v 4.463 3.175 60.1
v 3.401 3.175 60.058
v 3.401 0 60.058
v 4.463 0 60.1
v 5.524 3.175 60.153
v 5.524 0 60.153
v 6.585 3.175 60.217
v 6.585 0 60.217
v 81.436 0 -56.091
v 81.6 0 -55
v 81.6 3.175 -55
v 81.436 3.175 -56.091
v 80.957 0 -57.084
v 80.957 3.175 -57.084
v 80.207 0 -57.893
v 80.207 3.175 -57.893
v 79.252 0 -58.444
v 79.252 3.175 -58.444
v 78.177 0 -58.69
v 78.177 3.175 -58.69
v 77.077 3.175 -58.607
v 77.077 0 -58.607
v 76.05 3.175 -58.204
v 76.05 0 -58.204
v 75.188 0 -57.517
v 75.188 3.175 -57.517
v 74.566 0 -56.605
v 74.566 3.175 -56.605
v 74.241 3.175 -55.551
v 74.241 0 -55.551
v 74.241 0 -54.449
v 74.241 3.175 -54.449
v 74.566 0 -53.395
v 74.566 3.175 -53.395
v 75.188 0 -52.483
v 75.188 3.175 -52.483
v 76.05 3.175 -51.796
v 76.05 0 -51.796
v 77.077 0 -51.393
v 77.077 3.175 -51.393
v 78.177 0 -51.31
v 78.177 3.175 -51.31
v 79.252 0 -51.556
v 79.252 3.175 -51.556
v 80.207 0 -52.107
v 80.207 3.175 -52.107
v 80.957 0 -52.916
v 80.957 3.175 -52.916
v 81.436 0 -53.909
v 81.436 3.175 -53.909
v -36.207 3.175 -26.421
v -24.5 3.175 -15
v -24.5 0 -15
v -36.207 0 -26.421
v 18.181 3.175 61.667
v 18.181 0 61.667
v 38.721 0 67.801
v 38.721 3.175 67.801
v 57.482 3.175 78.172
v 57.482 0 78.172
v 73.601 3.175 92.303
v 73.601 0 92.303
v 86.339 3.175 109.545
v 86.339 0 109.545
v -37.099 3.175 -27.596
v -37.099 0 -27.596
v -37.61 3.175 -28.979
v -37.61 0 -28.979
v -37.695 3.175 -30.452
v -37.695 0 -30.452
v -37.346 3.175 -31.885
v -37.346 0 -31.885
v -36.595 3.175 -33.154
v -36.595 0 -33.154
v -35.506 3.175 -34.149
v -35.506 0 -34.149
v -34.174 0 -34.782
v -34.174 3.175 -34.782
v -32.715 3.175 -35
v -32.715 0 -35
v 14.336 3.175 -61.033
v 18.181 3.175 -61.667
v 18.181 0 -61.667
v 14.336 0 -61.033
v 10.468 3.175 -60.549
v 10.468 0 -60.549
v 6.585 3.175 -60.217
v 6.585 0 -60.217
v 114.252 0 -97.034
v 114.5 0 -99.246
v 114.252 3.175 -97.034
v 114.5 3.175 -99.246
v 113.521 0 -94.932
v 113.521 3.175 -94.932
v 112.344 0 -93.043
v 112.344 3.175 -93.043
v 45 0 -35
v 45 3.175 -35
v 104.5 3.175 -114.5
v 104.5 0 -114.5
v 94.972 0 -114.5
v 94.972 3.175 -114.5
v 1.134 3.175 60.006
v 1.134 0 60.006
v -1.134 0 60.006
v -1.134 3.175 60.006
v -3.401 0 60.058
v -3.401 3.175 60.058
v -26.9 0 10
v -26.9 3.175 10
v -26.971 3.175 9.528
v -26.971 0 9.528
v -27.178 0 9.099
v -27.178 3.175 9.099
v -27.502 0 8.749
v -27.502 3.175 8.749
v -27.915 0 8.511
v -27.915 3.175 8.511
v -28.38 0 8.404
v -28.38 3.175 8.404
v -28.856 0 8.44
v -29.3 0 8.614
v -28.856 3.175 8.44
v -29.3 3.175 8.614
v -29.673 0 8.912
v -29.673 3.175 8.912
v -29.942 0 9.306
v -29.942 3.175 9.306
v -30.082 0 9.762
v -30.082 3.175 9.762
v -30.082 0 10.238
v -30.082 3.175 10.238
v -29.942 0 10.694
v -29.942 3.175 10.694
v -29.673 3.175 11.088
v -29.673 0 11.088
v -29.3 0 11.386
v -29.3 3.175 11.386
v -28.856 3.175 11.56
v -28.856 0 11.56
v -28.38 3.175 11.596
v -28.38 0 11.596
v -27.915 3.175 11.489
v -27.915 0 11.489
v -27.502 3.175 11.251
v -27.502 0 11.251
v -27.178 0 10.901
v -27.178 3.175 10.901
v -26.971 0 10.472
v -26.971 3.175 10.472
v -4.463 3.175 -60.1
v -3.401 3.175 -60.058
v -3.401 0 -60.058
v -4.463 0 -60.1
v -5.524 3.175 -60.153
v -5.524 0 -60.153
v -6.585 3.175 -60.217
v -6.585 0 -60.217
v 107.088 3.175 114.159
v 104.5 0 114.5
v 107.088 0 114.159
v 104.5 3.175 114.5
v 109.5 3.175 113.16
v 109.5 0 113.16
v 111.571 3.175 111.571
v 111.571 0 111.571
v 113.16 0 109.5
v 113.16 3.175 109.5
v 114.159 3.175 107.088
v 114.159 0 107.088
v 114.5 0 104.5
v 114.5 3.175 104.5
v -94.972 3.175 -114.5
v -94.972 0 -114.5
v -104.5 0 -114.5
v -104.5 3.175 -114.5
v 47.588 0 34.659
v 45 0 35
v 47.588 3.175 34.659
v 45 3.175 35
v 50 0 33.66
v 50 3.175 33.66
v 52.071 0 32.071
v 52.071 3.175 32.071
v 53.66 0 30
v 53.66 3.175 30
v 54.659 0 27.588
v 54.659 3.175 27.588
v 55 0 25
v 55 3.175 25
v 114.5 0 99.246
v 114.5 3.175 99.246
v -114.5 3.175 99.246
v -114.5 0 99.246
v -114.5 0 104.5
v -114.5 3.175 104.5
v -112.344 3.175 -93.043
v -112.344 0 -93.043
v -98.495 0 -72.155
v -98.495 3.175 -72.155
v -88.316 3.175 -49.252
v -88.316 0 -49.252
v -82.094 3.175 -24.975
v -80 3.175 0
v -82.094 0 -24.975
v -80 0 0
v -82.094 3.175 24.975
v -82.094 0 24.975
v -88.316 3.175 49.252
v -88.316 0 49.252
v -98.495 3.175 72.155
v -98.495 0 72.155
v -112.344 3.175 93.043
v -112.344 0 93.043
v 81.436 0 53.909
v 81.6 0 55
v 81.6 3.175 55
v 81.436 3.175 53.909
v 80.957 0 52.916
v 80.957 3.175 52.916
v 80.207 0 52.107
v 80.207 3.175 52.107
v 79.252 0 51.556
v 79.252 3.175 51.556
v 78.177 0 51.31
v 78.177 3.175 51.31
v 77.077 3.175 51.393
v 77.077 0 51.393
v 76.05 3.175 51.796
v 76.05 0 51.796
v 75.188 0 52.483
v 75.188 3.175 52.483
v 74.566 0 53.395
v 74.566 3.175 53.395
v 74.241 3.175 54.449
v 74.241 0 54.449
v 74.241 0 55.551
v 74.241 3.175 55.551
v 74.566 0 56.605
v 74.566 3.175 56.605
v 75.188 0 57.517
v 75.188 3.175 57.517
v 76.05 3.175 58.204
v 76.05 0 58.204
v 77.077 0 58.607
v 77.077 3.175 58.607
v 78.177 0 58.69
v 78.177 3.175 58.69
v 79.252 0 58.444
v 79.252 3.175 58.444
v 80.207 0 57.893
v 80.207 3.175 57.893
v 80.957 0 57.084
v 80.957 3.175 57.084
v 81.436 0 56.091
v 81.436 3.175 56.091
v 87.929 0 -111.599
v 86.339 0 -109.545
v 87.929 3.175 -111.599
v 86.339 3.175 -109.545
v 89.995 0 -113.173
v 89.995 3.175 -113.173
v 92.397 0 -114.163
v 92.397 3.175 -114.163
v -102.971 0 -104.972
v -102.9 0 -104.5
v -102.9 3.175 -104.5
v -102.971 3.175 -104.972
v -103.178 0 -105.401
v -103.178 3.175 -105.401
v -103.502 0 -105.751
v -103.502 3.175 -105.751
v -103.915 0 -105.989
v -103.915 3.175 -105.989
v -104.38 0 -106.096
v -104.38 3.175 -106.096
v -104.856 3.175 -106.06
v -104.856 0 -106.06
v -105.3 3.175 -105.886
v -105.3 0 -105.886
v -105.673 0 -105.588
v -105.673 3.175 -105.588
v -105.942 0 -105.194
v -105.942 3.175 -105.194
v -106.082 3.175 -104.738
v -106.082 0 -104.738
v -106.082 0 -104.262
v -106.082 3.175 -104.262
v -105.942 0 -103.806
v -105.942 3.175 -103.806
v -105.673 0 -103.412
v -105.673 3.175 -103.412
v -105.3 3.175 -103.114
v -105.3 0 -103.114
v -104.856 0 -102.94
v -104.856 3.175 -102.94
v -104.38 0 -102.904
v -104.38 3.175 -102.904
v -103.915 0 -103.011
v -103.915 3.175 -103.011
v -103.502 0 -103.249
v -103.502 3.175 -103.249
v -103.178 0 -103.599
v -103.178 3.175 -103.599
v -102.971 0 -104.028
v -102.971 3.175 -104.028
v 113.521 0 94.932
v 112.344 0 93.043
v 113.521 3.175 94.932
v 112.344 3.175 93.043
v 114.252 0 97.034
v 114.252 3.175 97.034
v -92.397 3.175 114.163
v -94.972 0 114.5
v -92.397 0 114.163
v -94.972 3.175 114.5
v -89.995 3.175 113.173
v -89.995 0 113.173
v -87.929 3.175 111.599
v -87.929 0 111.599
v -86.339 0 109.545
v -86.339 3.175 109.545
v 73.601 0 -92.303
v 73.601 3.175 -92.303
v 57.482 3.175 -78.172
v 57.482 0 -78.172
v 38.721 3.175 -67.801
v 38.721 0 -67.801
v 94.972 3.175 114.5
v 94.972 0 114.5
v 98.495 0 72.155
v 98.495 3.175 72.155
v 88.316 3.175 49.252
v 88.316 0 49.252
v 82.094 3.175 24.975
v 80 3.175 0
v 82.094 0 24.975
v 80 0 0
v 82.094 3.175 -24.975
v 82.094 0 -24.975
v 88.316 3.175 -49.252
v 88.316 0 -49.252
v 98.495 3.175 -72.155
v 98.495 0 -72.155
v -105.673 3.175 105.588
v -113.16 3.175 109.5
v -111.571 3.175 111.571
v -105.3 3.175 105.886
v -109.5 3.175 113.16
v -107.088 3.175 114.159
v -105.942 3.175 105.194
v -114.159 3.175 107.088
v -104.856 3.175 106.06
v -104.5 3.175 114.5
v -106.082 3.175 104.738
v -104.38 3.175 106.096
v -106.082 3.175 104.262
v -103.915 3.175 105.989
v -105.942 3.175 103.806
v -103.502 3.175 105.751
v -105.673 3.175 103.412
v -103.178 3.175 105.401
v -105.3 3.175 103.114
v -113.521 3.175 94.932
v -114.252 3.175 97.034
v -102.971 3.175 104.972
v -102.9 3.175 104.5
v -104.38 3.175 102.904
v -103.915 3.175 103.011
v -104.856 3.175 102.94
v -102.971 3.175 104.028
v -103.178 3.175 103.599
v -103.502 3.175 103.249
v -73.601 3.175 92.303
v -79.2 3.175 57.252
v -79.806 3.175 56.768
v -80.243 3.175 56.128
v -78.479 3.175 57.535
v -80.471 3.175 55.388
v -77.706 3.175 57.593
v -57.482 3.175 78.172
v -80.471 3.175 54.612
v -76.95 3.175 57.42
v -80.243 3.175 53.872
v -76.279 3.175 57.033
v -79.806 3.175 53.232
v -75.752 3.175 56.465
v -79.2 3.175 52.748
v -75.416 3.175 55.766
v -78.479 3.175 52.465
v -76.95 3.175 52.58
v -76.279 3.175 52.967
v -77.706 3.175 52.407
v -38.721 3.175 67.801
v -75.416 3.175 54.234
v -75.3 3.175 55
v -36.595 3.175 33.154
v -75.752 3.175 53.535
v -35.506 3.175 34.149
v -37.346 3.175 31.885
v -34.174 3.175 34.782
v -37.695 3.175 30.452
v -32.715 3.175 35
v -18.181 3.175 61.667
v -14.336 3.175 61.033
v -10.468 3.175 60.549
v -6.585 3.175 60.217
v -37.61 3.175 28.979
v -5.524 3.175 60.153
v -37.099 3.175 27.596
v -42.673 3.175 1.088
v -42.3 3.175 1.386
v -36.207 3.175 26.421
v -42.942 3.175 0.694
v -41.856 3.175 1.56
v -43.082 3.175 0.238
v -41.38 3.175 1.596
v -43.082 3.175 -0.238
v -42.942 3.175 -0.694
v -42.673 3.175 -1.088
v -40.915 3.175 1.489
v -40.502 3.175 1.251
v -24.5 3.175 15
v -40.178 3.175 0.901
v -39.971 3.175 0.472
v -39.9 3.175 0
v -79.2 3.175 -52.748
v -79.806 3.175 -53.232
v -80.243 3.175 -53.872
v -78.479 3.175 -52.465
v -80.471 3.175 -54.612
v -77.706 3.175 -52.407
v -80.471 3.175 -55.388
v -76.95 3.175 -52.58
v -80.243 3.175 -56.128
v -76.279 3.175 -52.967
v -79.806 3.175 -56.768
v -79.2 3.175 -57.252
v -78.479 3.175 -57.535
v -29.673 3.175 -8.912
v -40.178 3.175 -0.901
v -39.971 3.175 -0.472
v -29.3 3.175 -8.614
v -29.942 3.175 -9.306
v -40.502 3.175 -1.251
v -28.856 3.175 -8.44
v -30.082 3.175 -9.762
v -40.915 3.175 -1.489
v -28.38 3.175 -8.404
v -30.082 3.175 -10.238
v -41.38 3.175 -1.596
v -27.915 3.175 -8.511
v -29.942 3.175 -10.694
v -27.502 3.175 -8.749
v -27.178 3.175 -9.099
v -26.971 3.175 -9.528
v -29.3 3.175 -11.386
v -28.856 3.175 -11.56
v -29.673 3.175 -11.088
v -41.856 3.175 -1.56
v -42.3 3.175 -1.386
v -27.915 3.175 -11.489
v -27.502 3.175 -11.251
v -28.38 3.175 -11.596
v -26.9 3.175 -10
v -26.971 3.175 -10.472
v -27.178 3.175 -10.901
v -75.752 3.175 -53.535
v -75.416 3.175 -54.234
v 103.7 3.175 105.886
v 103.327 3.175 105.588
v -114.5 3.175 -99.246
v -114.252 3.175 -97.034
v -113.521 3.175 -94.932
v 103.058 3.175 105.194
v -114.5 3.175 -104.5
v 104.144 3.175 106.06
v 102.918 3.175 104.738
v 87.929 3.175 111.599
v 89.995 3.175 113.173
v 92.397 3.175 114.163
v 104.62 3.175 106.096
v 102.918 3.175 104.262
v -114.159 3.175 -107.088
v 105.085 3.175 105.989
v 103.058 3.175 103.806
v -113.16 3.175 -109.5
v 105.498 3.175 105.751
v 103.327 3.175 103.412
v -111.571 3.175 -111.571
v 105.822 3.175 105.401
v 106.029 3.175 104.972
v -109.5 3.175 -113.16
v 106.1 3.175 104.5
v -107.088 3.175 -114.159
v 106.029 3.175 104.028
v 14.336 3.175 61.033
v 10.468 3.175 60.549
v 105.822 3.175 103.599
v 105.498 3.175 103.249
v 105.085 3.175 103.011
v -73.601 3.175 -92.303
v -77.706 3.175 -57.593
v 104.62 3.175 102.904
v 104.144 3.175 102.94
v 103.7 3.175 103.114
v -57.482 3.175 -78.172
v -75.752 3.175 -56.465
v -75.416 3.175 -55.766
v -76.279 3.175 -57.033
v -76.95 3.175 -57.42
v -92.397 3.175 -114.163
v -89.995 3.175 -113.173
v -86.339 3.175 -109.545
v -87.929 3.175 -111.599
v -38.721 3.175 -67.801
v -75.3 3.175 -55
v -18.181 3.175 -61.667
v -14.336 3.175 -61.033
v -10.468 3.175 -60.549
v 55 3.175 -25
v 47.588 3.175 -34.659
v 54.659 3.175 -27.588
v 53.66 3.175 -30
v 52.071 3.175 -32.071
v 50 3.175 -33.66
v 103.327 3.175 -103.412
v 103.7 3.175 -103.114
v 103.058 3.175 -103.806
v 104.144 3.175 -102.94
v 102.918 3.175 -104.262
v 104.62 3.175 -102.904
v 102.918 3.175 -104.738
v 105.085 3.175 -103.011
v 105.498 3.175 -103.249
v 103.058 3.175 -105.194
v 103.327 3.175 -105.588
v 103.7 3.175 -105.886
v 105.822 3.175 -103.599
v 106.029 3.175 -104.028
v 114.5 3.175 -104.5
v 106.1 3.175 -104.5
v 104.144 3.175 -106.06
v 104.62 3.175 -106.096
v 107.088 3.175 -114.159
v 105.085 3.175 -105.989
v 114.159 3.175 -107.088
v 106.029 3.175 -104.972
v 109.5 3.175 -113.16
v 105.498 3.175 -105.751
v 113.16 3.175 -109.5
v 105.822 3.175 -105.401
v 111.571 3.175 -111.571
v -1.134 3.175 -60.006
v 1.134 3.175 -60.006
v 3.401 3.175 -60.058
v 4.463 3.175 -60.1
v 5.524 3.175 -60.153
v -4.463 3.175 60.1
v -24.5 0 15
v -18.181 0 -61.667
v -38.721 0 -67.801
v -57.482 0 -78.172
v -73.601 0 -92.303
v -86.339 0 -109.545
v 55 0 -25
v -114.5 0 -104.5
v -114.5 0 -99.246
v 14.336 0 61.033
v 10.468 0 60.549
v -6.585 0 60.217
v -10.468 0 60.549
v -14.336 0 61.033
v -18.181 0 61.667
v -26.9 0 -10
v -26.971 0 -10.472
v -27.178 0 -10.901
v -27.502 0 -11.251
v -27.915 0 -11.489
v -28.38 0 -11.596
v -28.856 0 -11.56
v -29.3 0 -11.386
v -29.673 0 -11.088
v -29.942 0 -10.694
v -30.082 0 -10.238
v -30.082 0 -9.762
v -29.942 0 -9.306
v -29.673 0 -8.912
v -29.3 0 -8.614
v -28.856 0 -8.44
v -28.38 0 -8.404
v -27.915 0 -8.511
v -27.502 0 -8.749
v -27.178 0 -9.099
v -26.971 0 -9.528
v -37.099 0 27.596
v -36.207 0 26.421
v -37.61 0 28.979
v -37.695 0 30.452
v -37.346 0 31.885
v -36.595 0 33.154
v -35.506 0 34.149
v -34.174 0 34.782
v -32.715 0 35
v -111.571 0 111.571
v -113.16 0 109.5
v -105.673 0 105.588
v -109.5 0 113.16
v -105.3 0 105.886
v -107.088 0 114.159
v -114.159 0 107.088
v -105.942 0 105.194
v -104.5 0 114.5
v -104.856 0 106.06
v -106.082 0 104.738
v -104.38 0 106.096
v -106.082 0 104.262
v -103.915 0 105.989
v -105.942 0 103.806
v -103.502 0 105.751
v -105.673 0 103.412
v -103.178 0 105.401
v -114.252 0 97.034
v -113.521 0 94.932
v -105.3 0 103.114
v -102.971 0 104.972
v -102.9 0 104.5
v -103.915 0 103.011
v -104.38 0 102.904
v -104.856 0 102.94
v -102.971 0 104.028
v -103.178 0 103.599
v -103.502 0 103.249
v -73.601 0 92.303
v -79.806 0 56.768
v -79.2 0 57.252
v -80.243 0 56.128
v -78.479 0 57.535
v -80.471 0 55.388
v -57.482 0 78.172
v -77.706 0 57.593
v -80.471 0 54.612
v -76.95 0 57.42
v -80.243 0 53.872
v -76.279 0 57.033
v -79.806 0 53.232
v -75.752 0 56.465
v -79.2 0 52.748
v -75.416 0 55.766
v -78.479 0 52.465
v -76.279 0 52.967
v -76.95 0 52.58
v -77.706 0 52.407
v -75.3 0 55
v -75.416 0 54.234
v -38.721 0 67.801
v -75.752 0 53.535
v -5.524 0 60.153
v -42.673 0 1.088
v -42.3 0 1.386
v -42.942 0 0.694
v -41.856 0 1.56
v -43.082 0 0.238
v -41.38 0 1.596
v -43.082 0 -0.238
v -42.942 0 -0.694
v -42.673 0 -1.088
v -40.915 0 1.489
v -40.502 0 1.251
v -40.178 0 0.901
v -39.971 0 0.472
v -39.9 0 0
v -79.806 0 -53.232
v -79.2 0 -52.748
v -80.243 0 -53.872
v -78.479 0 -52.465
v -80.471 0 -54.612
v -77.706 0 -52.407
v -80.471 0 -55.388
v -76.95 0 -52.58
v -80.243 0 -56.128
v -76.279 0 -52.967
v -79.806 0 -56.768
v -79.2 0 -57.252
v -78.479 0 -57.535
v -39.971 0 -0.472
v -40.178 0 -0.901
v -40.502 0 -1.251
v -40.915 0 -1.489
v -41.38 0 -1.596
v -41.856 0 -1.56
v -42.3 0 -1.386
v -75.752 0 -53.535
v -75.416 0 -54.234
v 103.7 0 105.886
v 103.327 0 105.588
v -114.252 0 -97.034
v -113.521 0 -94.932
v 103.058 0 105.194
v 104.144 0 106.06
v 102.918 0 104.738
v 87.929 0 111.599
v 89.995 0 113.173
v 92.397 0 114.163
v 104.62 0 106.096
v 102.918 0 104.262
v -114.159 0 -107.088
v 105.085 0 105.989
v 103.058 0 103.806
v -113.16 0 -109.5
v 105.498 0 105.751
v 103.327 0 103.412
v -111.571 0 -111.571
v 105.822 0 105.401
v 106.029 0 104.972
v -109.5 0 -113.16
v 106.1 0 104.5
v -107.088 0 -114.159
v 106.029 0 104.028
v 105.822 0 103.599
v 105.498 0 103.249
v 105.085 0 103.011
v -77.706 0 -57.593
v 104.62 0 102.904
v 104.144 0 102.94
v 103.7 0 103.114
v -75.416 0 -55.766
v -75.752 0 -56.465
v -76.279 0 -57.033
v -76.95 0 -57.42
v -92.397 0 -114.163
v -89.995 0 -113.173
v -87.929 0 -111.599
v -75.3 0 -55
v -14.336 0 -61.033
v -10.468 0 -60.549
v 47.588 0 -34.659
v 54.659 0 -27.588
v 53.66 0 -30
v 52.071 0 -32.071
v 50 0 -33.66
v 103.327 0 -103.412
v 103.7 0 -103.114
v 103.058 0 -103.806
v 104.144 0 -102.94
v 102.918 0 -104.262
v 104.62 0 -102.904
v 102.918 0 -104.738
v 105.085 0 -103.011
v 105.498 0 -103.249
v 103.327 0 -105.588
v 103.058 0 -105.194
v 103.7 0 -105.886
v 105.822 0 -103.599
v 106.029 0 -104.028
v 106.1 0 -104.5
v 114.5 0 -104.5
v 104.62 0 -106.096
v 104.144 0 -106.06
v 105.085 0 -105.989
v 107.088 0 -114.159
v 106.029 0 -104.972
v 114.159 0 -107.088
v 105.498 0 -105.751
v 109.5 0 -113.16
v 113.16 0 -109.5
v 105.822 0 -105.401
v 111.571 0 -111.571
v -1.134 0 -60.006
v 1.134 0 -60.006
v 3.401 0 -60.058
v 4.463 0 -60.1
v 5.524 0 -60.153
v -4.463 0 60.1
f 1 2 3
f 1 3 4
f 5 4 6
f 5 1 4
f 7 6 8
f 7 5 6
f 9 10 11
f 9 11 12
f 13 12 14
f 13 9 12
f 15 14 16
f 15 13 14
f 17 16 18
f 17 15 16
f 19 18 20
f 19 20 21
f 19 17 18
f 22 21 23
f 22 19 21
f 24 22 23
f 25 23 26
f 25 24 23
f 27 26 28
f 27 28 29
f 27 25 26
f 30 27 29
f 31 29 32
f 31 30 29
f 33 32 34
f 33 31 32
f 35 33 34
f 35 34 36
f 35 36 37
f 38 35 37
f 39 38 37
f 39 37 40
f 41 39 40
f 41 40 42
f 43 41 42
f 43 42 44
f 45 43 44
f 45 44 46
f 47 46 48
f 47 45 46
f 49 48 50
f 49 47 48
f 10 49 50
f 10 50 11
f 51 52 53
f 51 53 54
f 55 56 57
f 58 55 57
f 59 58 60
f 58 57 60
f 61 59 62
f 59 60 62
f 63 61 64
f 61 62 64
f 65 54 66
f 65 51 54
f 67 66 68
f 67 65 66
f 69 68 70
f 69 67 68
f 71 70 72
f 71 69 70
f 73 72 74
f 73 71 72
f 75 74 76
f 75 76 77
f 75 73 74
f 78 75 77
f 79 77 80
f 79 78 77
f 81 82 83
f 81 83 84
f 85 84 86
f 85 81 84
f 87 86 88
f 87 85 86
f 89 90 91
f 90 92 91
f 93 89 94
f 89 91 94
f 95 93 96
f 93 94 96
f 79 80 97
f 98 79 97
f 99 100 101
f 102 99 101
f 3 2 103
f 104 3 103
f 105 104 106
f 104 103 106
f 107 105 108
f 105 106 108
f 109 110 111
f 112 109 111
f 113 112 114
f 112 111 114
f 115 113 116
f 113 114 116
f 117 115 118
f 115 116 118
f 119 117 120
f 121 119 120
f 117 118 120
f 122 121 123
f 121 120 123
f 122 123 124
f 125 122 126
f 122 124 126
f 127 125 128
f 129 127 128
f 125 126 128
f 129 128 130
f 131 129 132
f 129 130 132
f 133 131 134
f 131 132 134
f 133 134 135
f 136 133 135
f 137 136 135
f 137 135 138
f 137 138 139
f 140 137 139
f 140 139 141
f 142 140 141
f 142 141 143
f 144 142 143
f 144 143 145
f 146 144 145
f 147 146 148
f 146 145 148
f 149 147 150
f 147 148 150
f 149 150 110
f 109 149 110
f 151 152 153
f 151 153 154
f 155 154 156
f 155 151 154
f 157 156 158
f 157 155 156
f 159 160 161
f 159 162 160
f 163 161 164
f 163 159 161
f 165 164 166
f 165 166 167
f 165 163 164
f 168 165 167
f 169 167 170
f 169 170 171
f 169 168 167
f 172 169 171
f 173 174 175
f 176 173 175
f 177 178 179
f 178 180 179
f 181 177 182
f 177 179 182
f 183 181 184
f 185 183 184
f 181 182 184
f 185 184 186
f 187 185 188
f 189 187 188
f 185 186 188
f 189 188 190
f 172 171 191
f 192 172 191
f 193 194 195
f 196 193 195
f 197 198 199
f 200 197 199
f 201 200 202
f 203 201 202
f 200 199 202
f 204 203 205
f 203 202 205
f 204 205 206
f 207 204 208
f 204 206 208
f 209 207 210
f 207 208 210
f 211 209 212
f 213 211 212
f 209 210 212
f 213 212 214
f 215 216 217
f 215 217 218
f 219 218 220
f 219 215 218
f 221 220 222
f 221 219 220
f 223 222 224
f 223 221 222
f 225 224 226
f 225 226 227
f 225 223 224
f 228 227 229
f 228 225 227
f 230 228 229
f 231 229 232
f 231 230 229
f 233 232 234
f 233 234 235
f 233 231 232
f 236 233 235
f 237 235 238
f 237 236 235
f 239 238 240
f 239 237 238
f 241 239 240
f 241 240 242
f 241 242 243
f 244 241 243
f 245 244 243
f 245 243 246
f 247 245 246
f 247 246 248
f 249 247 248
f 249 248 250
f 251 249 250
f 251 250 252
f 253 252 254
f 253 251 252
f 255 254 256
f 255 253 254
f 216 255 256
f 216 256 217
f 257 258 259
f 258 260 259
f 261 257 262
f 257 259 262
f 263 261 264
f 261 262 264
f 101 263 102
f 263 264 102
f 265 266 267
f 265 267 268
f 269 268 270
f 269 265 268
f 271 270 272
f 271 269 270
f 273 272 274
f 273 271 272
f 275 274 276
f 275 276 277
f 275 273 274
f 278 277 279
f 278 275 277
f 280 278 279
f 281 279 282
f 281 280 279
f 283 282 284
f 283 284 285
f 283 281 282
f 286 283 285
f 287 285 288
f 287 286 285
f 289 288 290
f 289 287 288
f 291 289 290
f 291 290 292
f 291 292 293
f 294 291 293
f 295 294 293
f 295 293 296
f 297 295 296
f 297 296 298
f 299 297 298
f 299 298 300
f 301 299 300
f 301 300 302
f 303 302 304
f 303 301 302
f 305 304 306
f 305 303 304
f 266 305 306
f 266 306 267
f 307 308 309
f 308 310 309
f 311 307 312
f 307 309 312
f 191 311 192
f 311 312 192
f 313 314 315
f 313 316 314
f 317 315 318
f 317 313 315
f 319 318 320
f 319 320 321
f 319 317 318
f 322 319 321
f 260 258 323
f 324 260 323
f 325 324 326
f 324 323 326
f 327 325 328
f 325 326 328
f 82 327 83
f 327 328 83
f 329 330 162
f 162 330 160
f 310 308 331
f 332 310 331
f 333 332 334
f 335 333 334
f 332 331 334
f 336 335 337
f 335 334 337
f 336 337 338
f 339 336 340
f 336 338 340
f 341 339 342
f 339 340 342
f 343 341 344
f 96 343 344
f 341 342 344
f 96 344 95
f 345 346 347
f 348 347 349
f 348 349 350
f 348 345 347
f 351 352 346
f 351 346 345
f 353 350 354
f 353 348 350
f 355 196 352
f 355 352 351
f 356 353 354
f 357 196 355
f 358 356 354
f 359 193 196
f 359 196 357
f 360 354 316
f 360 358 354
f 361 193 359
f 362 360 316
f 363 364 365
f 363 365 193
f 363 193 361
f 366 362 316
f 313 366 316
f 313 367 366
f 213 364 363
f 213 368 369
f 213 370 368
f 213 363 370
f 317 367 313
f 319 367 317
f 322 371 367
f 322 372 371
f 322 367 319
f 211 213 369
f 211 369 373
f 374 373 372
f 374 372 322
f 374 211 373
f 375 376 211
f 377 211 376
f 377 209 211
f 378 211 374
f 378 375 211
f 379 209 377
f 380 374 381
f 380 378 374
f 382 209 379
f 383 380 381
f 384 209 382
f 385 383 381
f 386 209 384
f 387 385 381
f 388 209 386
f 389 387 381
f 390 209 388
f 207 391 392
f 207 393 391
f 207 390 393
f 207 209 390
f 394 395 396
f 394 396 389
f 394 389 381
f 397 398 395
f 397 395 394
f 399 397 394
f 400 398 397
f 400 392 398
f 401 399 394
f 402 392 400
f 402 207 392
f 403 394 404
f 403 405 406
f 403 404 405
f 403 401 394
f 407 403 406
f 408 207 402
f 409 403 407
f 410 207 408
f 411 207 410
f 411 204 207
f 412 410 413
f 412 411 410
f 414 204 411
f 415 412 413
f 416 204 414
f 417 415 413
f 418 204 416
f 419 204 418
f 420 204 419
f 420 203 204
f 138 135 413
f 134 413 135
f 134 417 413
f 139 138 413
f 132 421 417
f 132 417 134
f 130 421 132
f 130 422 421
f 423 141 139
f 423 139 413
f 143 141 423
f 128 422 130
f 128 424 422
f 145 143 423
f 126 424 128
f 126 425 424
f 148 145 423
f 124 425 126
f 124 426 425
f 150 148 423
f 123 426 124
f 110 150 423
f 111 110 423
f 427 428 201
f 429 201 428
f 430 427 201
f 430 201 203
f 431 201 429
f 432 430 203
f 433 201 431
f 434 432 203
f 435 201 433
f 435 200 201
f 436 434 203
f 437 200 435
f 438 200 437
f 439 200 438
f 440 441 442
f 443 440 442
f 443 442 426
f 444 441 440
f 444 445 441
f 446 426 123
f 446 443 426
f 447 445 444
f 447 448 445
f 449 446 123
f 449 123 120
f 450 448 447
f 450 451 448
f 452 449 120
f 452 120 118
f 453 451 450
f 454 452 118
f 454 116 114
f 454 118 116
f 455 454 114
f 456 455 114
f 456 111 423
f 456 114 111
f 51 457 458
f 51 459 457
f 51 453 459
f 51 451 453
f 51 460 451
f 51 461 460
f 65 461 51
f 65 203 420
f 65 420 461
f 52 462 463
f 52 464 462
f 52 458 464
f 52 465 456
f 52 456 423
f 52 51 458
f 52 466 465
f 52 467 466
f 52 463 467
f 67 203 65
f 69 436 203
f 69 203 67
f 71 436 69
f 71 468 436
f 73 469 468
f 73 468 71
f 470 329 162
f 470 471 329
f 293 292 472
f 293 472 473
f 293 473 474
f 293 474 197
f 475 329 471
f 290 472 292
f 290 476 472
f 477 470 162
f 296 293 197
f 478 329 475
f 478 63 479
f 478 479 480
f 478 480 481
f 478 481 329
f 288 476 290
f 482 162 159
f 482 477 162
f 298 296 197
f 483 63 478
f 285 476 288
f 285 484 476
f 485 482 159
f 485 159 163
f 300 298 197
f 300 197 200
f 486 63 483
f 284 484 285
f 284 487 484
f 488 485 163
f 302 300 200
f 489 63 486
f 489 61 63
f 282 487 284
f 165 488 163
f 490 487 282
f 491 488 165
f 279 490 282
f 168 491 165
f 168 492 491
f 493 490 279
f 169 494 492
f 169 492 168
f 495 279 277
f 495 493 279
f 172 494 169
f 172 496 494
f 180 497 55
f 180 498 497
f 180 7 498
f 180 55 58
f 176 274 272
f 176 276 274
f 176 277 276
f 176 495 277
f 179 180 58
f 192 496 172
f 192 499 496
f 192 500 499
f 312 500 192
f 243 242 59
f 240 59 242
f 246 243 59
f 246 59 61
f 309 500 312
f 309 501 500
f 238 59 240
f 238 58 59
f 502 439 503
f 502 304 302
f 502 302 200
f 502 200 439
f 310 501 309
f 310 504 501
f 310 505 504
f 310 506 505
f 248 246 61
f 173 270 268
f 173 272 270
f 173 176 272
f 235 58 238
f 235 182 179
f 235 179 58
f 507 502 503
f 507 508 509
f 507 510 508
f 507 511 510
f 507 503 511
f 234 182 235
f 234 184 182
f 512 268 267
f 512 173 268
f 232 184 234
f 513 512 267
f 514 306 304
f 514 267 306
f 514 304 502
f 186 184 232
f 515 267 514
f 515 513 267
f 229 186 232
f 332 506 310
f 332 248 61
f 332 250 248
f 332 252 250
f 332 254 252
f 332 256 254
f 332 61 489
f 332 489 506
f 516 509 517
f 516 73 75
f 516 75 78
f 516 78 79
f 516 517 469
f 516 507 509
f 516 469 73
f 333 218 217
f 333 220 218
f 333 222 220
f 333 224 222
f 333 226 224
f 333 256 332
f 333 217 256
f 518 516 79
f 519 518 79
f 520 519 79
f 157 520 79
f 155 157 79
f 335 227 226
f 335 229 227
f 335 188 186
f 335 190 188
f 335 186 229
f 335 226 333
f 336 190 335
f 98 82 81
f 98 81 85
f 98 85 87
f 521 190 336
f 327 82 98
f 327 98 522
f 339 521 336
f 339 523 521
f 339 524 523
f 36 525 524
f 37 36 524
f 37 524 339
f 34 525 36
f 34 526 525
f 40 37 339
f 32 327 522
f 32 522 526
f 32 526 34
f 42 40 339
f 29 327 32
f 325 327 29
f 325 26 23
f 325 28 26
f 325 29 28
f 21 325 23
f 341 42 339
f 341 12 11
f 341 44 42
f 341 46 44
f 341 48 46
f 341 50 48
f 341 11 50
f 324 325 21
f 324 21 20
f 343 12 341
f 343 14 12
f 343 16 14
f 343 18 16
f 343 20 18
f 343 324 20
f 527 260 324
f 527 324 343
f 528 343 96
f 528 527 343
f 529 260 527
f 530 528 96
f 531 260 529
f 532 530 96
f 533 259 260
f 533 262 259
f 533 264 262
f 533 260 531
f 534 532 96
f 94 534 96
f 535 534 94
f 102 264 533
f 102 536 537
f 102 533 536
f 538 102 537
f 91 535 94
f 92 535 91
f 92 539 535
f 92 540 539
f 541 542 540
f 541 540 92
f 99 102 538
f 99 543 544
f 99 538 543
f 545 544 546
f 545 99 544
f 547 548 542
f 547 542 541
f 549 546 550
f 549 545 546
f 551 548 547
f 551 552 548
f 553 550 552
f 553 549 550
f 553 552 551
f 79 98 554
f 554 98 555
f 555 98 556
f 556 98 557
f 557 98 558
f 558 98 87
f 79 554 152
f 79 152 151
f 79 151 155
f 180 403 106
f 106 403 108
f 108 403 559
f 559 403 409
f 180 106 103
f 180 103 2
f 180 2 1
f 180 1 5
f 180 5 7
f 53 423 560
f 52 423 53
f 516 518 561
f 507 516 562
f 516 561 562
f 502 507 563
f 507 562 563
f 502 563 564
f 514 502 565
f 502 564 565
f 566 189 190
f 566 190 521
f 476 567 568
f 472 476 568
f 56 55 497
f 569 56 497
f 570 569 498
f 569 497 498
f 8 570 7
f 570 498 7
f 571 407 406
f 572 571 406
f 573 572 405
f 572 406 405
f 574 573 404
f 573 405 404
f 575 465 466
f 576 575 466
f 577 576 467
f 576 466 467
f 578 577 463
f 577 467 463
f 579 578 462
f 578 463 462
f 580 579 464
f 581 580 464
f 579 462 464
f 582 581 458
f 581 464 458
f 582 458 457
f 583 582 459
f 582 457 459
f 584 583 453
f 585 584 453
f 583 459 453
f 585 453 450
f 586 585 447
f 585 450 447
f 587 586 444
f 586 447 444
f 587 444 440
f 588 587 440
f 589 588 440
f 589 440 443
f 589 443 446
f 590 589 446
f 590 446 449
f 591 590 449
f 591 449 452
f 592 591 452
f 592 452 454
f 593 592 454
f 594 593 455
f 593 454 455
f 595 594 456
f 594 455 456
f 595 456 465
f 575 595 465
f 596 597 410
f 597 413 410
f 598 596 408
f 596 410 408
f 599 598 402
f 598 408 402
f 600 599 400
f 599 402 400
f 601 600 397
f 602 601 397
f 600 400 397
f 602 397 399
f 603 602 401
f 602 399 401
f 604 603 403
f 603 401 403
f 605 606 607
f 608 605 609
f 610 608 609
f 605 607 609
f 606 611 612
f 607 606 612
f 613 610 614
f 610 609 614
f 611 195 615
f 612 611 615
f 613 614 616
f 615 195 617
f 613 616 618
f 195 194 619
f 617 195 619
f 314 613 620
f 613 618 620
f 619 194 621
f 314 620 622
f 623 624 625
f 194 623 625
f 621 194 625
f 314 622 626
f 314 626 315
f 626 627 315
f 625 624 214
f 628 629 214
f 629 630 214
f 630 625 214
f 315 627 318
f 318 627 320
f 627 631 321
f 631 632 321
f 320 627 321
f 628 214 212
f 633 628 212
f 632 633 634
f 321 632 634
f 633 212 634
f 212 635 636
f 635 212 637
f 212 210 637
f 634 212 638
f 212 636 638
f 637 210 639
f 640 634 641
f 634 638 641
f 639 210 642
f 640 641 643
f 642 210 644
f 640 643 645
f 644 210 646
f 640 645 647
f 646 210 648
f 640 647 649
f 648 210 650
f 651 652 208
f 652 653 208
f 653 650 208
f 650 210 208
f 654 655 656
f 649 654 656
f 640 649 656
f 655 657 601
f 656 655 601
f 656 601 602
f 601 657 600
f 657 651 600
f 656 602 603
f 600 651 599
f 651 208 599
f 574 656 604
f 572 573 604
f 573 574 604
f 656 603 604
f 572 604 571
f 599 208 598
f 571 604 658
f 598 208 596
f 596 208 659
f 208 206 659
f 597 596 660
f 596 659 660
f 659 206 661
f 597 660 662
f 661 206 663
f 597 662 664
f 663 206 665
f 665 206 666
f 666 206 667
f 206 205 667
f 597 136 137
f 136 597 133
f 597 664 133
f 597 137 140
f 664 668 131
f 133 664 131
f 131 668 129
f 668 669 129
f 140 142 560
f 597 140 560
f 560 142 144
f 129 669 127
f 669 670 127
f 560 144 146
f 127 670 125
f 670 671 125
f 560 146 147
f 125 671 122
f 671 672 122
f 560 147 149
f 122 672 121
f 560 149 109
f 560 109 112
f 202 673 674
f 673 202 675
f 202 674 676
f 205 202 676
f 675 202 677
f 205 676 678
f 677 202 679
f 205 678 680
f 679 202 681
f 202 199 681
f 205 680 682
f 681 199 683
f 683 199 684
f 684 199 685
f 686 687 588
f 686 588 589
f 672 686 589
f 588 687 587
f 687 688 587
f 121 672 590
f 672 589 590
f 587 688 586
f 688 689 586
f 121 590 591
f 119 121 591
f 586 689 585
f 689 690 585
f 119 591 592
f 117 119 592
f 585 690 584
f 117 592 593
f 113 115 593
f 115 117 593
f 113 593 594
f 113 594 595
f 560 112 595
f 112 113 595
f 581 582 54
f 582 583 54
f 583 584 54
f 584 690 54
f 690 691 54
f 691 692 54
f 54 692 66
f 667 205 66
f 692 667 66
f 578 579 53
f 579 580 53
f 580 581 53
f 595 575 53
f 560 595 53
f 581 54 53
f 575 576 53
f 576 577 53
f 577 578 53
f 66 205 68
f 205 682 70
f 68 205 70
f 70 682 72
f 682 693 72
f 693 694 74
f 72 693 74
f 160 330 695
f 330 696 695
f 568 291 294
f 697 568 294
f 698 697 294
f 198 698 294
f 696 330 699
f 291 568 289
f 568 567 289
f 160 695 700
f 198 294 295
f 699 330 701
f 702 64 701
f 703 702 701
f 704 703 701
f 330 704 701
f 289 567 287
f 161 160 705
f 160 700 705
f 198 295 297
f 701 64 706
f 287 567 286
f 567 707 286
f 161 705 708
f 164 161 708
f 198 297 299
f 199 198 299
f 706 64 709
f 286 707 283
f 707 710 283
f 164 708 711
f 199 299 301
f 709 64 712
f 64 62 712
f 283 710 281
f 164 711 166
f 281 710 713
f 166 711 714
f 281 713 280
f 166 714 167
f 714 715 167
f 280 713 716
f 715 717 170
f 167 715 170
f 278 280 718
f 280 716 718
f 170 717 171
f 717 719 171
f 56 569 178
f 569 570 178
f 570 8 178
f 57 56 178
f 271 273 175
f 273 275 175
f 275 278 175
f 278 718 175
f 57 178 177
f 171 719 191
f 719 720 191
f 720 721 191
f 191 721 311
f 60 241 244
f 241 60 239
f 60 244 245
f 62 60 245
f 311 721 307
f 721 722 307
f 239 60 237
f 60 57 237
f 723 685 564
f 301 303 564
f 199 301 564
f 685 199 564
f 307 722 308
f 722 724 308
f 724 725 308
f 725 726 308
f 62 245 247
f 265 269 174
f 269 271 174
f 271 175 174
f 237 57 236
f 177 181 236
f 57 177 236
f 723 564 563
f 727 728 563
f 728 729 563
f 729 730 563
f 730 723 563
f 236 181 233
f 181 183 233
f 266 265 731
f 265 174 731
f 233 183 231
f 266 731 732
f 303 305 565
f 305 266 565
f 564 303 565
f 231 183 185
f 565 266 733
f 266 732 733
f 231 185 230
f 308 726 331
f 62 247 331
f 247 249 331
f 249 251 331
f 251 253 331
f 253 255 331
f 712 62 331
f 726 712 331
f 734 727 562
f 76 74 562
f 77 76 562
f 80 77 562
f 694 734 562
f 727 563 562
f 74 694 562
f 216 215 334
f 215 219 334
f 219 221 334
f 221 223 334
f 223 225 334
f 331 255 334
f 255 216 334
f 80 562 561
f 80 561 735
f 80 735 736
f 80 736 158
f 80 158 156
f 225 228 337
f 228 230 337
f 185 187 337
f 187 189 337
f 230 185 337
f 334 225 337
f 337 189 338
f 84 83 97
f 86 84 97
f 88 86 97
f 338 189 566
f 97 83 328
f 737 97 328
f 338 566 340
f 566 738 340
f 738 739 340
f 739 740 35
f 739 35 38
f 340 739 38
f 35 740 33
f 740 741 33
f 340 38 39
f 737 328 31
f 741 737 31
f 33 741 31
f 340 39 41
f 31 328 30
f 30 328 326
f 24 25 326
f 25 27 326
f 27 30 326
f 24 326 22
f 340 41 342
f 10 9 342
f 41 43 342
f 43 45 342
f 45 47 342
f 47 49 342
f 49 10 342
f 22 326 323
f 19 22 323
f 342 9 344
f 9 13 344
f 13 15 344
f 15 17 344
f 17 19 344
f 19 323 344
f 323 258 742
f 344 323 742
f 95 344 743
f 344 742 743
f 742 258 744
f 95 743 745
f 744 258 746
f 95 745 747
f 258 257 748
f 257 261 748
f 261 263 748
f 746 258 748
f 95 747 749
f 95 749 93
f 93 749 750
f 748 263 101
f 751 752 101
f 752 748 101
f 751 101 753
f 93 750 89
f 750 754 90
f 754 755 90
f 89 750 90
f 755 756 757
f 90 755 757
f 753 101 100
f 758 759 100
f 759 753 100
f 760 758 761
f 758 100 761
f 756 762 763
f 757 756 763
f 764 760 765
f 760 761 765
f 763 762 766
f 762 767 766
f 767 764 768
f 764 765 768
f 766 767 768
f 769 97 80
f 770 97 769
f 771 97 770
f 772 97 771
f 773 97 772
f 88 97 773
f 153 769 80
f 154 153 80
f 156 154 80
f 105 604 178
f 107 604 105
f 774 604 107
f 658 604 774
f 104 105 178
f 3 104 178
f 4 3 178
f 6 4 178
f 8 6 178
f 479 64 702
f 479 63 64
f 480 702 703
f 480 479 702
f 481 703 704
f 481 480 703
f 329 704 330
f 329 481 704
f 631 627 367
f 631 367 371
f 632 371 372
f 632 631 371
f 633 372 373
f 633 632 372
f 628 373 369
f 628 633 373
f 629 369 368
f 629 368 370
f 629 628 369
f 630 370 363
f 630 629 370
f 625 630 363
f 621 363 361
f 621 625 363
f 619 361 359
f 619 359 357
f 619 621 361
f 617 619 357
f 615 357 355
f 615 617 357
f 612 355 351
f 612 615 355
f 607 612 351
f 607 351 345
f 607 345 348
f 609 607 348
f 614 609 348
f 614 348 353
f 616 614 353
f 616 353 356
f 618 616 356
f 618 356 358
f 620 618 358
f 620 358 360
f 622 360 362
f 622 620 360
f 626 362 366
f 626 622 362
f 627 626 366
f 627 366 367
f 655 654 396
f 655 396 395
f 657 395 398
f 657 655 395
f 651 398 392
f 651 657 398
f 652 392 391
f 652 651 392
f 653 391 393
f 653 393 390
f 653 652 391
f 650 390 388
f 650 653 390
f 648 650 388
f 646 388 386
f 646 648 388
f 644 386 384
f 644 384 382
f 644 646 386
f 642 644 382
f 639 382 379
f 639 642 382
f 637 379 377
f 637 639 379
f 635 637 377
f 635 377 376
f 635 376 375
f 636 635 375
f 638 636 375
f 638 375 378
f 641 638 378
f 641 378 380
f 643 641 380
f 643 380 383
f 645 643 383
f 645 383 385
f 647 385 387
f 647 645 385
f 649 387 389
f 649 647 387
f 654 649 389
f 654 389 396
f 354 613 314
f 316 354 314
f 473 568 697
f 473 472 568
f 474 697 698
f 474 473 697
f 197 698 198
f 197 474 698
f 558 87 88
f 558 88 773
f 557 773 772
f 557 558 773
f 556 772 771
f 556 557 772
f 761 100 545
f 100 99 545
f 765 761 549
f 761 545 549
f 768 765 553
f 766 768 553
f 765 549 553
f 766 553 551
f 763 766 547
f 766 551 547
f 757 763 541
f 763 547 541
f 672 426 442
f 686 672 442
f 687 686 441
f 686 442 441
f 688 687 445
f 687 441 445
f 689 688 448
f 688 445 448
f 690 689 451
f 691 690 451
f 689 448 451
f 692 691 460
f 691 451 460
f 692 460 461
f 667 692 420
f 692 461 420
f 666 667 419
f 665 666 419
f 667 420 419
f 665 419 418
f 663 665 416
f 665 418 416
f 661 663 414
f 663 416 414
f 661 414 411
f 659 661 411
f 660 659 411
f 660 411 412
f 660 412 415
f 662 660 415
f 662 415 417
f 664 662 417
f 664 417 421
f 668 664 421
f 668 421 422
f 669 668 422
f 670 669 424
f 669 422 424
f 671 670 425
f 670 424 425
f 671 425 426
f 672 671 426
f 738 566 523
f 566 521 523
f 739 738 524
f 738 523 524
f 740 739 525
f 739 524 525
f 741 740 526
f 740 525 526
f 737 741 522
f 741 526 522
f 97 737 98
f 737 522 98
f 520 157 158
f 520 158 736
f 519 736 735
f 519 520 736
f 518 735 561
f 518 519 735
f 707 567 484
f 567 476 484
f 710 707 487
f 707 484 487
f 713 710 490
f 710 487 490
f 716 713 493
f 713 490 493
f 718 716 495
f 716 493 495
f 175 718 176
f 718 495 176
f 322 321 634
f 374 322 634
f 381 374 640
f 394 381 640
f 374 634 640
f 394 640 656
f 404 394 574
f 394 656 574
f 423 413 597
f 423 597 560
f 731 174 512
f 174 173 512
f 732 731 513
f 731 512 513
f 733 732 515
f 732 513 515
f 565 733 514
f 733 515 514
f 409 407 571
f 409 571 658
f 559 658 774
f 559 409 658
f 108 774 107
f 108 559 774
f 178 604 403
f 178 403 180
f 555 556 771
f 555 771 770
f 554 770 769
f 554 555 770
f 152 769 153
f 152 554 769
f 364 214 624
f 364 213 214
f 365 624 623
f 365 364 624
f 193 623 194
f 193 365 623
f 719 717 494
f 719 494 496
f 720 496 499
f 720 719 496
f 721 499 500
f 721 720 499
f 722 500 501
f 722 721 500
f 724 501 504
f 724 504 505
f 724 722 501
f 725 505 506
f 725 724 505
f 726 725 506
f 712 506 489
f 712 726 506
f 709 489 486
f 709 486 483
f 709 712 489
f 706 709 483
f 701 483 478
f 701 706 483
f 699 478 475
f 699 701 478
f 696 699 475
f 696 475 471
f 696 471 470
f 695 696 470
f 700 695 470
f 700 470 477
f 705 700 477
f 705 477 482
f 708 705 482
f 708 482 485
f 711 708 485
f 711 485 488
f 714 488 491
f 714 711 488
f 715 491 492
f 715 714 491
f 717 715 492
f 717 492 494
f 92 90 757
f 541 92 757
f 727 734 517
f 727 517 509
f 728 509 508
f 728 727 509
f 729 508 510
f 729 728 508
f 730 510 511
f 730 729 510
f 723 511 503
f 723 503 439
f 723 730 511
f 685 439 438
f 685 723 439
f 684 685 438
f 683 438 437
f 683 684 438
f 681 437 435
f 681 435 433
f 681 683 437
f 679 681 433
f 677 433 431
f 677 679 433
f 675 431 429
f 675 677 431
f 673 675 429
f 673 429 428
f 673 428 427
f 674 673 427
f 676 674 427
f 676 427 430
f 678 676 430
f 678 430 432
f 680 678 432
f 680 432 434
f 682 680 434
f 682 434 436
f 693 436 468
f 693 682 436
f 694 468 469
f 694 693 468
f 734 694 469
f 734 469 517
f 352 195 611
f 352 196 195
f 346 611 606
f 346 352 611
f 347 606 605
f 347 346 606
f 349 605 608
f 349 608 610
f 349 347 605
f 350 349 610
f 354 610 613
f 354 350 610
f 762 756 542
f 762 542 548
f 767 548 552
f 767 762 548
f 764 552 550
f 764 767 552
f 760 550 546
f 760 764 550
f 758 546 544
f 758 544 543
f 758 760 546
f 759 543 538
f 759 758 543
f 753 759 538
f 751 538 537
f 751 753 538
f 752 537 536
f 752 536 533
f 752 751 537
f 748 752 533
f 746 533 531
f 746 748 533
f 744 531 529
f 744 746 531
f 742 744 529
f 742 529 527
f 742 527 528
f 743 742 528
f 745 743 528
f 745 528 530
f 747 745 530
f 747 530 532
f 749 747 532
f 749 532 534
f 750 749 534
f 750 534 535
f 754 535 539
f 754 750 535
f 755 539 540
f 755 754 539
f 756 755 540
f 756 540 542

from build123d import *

# Parameters (mm, degrees)
SKETCH1_R           = 3.7
SKETCH1_R_2         = 1.6
SKETCH1_R_3         = 2.6
SKETCH1_W           = 110
SKETCH1_H           = 70
BOSS_EXTRUDE1_DEPTH = 3.175
FILLET1_R           = 10
CUT_EXTRUDE1_DEPTH  = 3.175
SKETCH3_3_R         = 1.6
BOSS_EXTRUDE2_DEPTH = 3.175
SKETCH4_R           = 1.6
BOSS_EXTRUDE3_DEPTH = 3.175
FILLET2_R           = 5


with BuildPart() as part:
    # Sketch1 → Boss-Extrude1 (new body)
    with BuildSketch(Plane(origin=(0, 0, 0), x_dir=(1, 0, 0), z_dir=(0, 1, 0))):
        with BuildLine():
            Line((-114.5, 114.5), (-114.5, 95.706582846))
            ThreePointArc((-114.5, 95.706582846), (-80, 0), (-114.5, -95.706582846))
            Line((-114.5, -95.706582846), (-114.5, -114.5))
            Line((-114.5, -114.5), (-89.049143735, -114.5))
            ThreePointArc((-89.049143735, -114.5), (-58.383323853, -78.812639556), (-14.791551643, -61.1))
            ThreePointArc((-14.791551643, -61.1), (0, -65), (14.791551643, -61.1))
            ThreePointArc((14.791551643, -61.1), (58.383323853, -78.812639556), (89.049143735, -114.5))
            Line((89.049143735, -114.5), (114.5, -114.5))
            Line((114.5, -114.5), (114.5, -95.706582846))
            ThreePointArc((114.5, -95.706582846), (80, 0), (114.5, 95.706582846))
            Line((114.5, 95.706582846), (114.5, 114.5))
            Line((114.5, 114.5), (89.049143735, 114.5))
            ThreePointArc((89.049143735, 114.5), (58.383323853, 78.812639556), (14.791551643, 61.1))
            ThreePointArc((14.791551643, 61.1), (0, 65), (-14.791551643, 61.1))
            ThreePointArc((-14.791551643, 61.1), (-58.383323853, 78.812639556), (-89.049143735, 114.5))
            Line((-89.049143735, 114.5), (-114.5, 114.5))
        make_face()
        with Locations((77.9, 55)):
            Circle(SKETCH1_R, mode=Mode.SUBTRACT)
        with Locations((-10, 50)):
            Circle(SKETCH1_R_2, mode=Mode.SUBTRACT)
        with Locations((-104.5, 104.5)):
            Circle(SKETCH1_R_2, mode=Mode.SUBTRACT)
        with Locations((-5, 60)):
            Circle(SKETCH1_R_2, mode=Mode.SUBTRACT)
        with Locations((77.9, -55)):
            Circle(SKETCH1_R, mode=Mode.SUBTRACT)
        with Locations((-77.9, 55)):
            Circle(SKETCH1_R_3, mode=Mode.SUBTRACT)
        with Locations((-104.5, -104.5)):
            Circle(SKETCH1_R_2, mode=Mode.SUBTRACT)
        with Locations((-77.9, -55)):
            Circle(SKETCH1_R_3, mode=Mode.SUBTRACT)
        with Locations((-10, -50)):
            Circle(SKETCH1_R_2, mode=Mode.SUBTRACT)
        with Locations((-5, -60)):
            Circle(SKETCH1_R_2, mode=Mode.SUBTRACT)
        with Locations((104.5, -104.5)):
            Circle(SKETCH1_R_2, mode=Mode.SUBTRACT)
        with Locations((5, -60)):
            Circle(SKETCH1_R_2, mode=Mode.SUBTRACT)
        with Locations((10, -50)):
            Circle(SKETCH1_R_2, mode=Mode.SUBTRACT)
        with Locations((104.5, 104.5)):
            Circle(SKETCH1_R_2, mode=Mode.SUBTRACT)
        with Locations((10, 50)):
            Circle(SKETCH1_R_2, mode=Mode.SUBTRACT)
        with Locations((5, 60)):
            Circle(SKETCH1_R_2, mode=Mode.SUBTRACT)
        Rectangle(SKETCH1_W, SKETCH1_H, mode=Mode.SUBTRACT)
    extrude(amount=BOSS_EXTRUDE1_DEPTH)

    # Fillet1
    fillet1_edges = [part.edges().sort_by_distance(p)[0] for p in [
        (-114.5, 1.5875, 114.5),
        (-114.5, 1.5875, 95.706582846),
        (-114.5, 1.5875, -95.706582846),
        (-114.5, 1.5875, -114.5),
        (-89.049143735, 1.5875, -114.5),
        (-14.791551643, 1.5875, -61.1),
        (14.791551643, 1.5875, -61.1),
        (89.049143735, 1.5875, -114.5),
        (114.5, 1.5875, -114.5),
        (114.5, 1.5875, -95.706582846),
        (114.5, 1.5875, 95.706582846),
        (114.5, 1.5875, 114.5),
        (89.049143735, 1.5875, 114.5),
        (14.791551643, 1.5875, 61.1),
        (-14.791551643, 1.5875, 61.1),
        (-89.049143735, 1.5875, 114.5),
        (-55, 1.5875, -35),
        (-55, 1.5875, 35),
        (55, 1.5875, 35),
        (55, 1.5875, -35),
    ]]
    fillet(fillet1_edges, radius=FILLET1_R)

    # Sketch3 → Cut-Extrude1 (cut)
    with BuildSketch(Plane(origin=(0, 3.175, 0), x_dir=(1, 0, 0), z_dir=(0, 1, 0))):
        with BuildLine():
            Line((-86.338513092, -109.545454545), (86.338513092, -109.545454545))
            ThreePointArc((86.338513092, -109.545454545), (57.482053735, -78.172049406), (18.181186858, -61.666666667))
            ThreePointArc((18.181186858, -61.666666667), (-41.646726907, -69.084928983), (-86.338513092, -109.545454545))
        make_face()
        with BuildLine():
            Line((-86.338513092, 109.545454545), (86.338513092, 109.545454545))
            ThreePointArc((86.338513092, 109.545454545), (57.482053735, 78.172049406), (18.181186858, 61.666666667))
            ThreePointArc((18.181186858, 61.666666667), (-41.646726907, 69.084928983), (-86.338513092, 109.545454545))
        make_face()
    extrude(amount=-CUT_EXTRUDE1_DEPTH, mode=Mode.SUBTRACT)

    # Sketch3<3> → Boss-Extrude2 (add)
    with BuildSketch(Plane(origin=(0, 3.175, 0), x_dir=(1, 0, 0), z_dir=(0, 1, 0))):
        with BuildLine():
            ThreePointArc((-3.401046245, -60.057852312), (-5.079900187, -58.401996258), (-6.585208119, -60.217060406))
            ThreePointArc((-6.585208119, -60.217060406), (-4.993761694, -60.124766112), (-3.401046245, -60.057852312))
        make_face()
        with BuildLine():
            ThreePointArc((3.401046245, -60.057852312), (4.993761694, -60.124766112), (6.585208119, -60.217060406))
            ThreePointArc((6.585208119, -60.217060406), (5.079900187, -58.401996258), (3.401046245, -60.057852312))
        make_face()
        with BuildLine():
            ThreePointArc((-3.401046245, 60.057852312), (-4.993761694, 60.124766112), (-6.585208119, 60.217060406))
            ThreePointArc((-6.585208119, 60.217060406), (-5.079900187, 58.401996258), (-3.401046245, 60.057852312))
        make_face()
        with BuildLine():
            ThreePointArc((3.401046245, 60.057852312), (5.079900187, 58.401996258), (6.585208119, 60.217060406))
            ThreePointArc((6.585208119, 60.217060406), (4.993761694, 60.124766112), (3.401046245, 60.057852312))
        make_face()
        with Locations((10, 50)):
            Circle(SKETCH3_3_R)
        with Locations((-10, 50)):
            Circle(SKETCH3_3_R)
        with Locations((-10, -50)):
            Circle(SKETCH3_3_R)
        with Locations((10, -50)):
            Circle(SKETCH3_3_R)
    extrude(amount=-BOSS_EXTRUDE2_DEPTH)

    # Sketch4 → Boss-Extrude3 (add)
    with BuildSketch(Plane(origin=(0, 3.175, 0), x_dir=(1, 0, 0), z_dir=(0, 1, 0))):
        with BuildLine():
            Line((-24.5, -15), (-24.5, 15))
            Line((-24.5, 15), (-45, 35))
            ThreePointArc((-45, 35), (-52.071067812, 32.071067812), (-55, 25))
            Line((-55, 25), (-55, -25))
            ThreePointArc((-55, -25), (-52.071067812, -32.071067812), (-45, -35))
            Line((-45, -35), (-24.5, -15))
        make_face()
        with Locations((-28.5, 10)):
            Circle(SKETCH4_R, mode=Mode.SUBTRACT)
        with Locations((-28.5, -10)):
            Circle(SKETCH4_R, mode=Mode.SUBTRACT)
        with Locations((-41.5, 0)):
            Circle(SKETCH4_R, mode=Mode.SUBTRACT)
    extrude(amount=-BOSS_EXTRUDE3_DEPTH)

    # Fillet2
    fillet2_edges = [part.edges().sort_by_distance(p)[0] for p in [
        (-45, 1.5875, 35),
        (-45, 1.5875, -35),
    ]]
    fillet(fillet2_edges, radius=FILLET2_R)


solid = part.part
